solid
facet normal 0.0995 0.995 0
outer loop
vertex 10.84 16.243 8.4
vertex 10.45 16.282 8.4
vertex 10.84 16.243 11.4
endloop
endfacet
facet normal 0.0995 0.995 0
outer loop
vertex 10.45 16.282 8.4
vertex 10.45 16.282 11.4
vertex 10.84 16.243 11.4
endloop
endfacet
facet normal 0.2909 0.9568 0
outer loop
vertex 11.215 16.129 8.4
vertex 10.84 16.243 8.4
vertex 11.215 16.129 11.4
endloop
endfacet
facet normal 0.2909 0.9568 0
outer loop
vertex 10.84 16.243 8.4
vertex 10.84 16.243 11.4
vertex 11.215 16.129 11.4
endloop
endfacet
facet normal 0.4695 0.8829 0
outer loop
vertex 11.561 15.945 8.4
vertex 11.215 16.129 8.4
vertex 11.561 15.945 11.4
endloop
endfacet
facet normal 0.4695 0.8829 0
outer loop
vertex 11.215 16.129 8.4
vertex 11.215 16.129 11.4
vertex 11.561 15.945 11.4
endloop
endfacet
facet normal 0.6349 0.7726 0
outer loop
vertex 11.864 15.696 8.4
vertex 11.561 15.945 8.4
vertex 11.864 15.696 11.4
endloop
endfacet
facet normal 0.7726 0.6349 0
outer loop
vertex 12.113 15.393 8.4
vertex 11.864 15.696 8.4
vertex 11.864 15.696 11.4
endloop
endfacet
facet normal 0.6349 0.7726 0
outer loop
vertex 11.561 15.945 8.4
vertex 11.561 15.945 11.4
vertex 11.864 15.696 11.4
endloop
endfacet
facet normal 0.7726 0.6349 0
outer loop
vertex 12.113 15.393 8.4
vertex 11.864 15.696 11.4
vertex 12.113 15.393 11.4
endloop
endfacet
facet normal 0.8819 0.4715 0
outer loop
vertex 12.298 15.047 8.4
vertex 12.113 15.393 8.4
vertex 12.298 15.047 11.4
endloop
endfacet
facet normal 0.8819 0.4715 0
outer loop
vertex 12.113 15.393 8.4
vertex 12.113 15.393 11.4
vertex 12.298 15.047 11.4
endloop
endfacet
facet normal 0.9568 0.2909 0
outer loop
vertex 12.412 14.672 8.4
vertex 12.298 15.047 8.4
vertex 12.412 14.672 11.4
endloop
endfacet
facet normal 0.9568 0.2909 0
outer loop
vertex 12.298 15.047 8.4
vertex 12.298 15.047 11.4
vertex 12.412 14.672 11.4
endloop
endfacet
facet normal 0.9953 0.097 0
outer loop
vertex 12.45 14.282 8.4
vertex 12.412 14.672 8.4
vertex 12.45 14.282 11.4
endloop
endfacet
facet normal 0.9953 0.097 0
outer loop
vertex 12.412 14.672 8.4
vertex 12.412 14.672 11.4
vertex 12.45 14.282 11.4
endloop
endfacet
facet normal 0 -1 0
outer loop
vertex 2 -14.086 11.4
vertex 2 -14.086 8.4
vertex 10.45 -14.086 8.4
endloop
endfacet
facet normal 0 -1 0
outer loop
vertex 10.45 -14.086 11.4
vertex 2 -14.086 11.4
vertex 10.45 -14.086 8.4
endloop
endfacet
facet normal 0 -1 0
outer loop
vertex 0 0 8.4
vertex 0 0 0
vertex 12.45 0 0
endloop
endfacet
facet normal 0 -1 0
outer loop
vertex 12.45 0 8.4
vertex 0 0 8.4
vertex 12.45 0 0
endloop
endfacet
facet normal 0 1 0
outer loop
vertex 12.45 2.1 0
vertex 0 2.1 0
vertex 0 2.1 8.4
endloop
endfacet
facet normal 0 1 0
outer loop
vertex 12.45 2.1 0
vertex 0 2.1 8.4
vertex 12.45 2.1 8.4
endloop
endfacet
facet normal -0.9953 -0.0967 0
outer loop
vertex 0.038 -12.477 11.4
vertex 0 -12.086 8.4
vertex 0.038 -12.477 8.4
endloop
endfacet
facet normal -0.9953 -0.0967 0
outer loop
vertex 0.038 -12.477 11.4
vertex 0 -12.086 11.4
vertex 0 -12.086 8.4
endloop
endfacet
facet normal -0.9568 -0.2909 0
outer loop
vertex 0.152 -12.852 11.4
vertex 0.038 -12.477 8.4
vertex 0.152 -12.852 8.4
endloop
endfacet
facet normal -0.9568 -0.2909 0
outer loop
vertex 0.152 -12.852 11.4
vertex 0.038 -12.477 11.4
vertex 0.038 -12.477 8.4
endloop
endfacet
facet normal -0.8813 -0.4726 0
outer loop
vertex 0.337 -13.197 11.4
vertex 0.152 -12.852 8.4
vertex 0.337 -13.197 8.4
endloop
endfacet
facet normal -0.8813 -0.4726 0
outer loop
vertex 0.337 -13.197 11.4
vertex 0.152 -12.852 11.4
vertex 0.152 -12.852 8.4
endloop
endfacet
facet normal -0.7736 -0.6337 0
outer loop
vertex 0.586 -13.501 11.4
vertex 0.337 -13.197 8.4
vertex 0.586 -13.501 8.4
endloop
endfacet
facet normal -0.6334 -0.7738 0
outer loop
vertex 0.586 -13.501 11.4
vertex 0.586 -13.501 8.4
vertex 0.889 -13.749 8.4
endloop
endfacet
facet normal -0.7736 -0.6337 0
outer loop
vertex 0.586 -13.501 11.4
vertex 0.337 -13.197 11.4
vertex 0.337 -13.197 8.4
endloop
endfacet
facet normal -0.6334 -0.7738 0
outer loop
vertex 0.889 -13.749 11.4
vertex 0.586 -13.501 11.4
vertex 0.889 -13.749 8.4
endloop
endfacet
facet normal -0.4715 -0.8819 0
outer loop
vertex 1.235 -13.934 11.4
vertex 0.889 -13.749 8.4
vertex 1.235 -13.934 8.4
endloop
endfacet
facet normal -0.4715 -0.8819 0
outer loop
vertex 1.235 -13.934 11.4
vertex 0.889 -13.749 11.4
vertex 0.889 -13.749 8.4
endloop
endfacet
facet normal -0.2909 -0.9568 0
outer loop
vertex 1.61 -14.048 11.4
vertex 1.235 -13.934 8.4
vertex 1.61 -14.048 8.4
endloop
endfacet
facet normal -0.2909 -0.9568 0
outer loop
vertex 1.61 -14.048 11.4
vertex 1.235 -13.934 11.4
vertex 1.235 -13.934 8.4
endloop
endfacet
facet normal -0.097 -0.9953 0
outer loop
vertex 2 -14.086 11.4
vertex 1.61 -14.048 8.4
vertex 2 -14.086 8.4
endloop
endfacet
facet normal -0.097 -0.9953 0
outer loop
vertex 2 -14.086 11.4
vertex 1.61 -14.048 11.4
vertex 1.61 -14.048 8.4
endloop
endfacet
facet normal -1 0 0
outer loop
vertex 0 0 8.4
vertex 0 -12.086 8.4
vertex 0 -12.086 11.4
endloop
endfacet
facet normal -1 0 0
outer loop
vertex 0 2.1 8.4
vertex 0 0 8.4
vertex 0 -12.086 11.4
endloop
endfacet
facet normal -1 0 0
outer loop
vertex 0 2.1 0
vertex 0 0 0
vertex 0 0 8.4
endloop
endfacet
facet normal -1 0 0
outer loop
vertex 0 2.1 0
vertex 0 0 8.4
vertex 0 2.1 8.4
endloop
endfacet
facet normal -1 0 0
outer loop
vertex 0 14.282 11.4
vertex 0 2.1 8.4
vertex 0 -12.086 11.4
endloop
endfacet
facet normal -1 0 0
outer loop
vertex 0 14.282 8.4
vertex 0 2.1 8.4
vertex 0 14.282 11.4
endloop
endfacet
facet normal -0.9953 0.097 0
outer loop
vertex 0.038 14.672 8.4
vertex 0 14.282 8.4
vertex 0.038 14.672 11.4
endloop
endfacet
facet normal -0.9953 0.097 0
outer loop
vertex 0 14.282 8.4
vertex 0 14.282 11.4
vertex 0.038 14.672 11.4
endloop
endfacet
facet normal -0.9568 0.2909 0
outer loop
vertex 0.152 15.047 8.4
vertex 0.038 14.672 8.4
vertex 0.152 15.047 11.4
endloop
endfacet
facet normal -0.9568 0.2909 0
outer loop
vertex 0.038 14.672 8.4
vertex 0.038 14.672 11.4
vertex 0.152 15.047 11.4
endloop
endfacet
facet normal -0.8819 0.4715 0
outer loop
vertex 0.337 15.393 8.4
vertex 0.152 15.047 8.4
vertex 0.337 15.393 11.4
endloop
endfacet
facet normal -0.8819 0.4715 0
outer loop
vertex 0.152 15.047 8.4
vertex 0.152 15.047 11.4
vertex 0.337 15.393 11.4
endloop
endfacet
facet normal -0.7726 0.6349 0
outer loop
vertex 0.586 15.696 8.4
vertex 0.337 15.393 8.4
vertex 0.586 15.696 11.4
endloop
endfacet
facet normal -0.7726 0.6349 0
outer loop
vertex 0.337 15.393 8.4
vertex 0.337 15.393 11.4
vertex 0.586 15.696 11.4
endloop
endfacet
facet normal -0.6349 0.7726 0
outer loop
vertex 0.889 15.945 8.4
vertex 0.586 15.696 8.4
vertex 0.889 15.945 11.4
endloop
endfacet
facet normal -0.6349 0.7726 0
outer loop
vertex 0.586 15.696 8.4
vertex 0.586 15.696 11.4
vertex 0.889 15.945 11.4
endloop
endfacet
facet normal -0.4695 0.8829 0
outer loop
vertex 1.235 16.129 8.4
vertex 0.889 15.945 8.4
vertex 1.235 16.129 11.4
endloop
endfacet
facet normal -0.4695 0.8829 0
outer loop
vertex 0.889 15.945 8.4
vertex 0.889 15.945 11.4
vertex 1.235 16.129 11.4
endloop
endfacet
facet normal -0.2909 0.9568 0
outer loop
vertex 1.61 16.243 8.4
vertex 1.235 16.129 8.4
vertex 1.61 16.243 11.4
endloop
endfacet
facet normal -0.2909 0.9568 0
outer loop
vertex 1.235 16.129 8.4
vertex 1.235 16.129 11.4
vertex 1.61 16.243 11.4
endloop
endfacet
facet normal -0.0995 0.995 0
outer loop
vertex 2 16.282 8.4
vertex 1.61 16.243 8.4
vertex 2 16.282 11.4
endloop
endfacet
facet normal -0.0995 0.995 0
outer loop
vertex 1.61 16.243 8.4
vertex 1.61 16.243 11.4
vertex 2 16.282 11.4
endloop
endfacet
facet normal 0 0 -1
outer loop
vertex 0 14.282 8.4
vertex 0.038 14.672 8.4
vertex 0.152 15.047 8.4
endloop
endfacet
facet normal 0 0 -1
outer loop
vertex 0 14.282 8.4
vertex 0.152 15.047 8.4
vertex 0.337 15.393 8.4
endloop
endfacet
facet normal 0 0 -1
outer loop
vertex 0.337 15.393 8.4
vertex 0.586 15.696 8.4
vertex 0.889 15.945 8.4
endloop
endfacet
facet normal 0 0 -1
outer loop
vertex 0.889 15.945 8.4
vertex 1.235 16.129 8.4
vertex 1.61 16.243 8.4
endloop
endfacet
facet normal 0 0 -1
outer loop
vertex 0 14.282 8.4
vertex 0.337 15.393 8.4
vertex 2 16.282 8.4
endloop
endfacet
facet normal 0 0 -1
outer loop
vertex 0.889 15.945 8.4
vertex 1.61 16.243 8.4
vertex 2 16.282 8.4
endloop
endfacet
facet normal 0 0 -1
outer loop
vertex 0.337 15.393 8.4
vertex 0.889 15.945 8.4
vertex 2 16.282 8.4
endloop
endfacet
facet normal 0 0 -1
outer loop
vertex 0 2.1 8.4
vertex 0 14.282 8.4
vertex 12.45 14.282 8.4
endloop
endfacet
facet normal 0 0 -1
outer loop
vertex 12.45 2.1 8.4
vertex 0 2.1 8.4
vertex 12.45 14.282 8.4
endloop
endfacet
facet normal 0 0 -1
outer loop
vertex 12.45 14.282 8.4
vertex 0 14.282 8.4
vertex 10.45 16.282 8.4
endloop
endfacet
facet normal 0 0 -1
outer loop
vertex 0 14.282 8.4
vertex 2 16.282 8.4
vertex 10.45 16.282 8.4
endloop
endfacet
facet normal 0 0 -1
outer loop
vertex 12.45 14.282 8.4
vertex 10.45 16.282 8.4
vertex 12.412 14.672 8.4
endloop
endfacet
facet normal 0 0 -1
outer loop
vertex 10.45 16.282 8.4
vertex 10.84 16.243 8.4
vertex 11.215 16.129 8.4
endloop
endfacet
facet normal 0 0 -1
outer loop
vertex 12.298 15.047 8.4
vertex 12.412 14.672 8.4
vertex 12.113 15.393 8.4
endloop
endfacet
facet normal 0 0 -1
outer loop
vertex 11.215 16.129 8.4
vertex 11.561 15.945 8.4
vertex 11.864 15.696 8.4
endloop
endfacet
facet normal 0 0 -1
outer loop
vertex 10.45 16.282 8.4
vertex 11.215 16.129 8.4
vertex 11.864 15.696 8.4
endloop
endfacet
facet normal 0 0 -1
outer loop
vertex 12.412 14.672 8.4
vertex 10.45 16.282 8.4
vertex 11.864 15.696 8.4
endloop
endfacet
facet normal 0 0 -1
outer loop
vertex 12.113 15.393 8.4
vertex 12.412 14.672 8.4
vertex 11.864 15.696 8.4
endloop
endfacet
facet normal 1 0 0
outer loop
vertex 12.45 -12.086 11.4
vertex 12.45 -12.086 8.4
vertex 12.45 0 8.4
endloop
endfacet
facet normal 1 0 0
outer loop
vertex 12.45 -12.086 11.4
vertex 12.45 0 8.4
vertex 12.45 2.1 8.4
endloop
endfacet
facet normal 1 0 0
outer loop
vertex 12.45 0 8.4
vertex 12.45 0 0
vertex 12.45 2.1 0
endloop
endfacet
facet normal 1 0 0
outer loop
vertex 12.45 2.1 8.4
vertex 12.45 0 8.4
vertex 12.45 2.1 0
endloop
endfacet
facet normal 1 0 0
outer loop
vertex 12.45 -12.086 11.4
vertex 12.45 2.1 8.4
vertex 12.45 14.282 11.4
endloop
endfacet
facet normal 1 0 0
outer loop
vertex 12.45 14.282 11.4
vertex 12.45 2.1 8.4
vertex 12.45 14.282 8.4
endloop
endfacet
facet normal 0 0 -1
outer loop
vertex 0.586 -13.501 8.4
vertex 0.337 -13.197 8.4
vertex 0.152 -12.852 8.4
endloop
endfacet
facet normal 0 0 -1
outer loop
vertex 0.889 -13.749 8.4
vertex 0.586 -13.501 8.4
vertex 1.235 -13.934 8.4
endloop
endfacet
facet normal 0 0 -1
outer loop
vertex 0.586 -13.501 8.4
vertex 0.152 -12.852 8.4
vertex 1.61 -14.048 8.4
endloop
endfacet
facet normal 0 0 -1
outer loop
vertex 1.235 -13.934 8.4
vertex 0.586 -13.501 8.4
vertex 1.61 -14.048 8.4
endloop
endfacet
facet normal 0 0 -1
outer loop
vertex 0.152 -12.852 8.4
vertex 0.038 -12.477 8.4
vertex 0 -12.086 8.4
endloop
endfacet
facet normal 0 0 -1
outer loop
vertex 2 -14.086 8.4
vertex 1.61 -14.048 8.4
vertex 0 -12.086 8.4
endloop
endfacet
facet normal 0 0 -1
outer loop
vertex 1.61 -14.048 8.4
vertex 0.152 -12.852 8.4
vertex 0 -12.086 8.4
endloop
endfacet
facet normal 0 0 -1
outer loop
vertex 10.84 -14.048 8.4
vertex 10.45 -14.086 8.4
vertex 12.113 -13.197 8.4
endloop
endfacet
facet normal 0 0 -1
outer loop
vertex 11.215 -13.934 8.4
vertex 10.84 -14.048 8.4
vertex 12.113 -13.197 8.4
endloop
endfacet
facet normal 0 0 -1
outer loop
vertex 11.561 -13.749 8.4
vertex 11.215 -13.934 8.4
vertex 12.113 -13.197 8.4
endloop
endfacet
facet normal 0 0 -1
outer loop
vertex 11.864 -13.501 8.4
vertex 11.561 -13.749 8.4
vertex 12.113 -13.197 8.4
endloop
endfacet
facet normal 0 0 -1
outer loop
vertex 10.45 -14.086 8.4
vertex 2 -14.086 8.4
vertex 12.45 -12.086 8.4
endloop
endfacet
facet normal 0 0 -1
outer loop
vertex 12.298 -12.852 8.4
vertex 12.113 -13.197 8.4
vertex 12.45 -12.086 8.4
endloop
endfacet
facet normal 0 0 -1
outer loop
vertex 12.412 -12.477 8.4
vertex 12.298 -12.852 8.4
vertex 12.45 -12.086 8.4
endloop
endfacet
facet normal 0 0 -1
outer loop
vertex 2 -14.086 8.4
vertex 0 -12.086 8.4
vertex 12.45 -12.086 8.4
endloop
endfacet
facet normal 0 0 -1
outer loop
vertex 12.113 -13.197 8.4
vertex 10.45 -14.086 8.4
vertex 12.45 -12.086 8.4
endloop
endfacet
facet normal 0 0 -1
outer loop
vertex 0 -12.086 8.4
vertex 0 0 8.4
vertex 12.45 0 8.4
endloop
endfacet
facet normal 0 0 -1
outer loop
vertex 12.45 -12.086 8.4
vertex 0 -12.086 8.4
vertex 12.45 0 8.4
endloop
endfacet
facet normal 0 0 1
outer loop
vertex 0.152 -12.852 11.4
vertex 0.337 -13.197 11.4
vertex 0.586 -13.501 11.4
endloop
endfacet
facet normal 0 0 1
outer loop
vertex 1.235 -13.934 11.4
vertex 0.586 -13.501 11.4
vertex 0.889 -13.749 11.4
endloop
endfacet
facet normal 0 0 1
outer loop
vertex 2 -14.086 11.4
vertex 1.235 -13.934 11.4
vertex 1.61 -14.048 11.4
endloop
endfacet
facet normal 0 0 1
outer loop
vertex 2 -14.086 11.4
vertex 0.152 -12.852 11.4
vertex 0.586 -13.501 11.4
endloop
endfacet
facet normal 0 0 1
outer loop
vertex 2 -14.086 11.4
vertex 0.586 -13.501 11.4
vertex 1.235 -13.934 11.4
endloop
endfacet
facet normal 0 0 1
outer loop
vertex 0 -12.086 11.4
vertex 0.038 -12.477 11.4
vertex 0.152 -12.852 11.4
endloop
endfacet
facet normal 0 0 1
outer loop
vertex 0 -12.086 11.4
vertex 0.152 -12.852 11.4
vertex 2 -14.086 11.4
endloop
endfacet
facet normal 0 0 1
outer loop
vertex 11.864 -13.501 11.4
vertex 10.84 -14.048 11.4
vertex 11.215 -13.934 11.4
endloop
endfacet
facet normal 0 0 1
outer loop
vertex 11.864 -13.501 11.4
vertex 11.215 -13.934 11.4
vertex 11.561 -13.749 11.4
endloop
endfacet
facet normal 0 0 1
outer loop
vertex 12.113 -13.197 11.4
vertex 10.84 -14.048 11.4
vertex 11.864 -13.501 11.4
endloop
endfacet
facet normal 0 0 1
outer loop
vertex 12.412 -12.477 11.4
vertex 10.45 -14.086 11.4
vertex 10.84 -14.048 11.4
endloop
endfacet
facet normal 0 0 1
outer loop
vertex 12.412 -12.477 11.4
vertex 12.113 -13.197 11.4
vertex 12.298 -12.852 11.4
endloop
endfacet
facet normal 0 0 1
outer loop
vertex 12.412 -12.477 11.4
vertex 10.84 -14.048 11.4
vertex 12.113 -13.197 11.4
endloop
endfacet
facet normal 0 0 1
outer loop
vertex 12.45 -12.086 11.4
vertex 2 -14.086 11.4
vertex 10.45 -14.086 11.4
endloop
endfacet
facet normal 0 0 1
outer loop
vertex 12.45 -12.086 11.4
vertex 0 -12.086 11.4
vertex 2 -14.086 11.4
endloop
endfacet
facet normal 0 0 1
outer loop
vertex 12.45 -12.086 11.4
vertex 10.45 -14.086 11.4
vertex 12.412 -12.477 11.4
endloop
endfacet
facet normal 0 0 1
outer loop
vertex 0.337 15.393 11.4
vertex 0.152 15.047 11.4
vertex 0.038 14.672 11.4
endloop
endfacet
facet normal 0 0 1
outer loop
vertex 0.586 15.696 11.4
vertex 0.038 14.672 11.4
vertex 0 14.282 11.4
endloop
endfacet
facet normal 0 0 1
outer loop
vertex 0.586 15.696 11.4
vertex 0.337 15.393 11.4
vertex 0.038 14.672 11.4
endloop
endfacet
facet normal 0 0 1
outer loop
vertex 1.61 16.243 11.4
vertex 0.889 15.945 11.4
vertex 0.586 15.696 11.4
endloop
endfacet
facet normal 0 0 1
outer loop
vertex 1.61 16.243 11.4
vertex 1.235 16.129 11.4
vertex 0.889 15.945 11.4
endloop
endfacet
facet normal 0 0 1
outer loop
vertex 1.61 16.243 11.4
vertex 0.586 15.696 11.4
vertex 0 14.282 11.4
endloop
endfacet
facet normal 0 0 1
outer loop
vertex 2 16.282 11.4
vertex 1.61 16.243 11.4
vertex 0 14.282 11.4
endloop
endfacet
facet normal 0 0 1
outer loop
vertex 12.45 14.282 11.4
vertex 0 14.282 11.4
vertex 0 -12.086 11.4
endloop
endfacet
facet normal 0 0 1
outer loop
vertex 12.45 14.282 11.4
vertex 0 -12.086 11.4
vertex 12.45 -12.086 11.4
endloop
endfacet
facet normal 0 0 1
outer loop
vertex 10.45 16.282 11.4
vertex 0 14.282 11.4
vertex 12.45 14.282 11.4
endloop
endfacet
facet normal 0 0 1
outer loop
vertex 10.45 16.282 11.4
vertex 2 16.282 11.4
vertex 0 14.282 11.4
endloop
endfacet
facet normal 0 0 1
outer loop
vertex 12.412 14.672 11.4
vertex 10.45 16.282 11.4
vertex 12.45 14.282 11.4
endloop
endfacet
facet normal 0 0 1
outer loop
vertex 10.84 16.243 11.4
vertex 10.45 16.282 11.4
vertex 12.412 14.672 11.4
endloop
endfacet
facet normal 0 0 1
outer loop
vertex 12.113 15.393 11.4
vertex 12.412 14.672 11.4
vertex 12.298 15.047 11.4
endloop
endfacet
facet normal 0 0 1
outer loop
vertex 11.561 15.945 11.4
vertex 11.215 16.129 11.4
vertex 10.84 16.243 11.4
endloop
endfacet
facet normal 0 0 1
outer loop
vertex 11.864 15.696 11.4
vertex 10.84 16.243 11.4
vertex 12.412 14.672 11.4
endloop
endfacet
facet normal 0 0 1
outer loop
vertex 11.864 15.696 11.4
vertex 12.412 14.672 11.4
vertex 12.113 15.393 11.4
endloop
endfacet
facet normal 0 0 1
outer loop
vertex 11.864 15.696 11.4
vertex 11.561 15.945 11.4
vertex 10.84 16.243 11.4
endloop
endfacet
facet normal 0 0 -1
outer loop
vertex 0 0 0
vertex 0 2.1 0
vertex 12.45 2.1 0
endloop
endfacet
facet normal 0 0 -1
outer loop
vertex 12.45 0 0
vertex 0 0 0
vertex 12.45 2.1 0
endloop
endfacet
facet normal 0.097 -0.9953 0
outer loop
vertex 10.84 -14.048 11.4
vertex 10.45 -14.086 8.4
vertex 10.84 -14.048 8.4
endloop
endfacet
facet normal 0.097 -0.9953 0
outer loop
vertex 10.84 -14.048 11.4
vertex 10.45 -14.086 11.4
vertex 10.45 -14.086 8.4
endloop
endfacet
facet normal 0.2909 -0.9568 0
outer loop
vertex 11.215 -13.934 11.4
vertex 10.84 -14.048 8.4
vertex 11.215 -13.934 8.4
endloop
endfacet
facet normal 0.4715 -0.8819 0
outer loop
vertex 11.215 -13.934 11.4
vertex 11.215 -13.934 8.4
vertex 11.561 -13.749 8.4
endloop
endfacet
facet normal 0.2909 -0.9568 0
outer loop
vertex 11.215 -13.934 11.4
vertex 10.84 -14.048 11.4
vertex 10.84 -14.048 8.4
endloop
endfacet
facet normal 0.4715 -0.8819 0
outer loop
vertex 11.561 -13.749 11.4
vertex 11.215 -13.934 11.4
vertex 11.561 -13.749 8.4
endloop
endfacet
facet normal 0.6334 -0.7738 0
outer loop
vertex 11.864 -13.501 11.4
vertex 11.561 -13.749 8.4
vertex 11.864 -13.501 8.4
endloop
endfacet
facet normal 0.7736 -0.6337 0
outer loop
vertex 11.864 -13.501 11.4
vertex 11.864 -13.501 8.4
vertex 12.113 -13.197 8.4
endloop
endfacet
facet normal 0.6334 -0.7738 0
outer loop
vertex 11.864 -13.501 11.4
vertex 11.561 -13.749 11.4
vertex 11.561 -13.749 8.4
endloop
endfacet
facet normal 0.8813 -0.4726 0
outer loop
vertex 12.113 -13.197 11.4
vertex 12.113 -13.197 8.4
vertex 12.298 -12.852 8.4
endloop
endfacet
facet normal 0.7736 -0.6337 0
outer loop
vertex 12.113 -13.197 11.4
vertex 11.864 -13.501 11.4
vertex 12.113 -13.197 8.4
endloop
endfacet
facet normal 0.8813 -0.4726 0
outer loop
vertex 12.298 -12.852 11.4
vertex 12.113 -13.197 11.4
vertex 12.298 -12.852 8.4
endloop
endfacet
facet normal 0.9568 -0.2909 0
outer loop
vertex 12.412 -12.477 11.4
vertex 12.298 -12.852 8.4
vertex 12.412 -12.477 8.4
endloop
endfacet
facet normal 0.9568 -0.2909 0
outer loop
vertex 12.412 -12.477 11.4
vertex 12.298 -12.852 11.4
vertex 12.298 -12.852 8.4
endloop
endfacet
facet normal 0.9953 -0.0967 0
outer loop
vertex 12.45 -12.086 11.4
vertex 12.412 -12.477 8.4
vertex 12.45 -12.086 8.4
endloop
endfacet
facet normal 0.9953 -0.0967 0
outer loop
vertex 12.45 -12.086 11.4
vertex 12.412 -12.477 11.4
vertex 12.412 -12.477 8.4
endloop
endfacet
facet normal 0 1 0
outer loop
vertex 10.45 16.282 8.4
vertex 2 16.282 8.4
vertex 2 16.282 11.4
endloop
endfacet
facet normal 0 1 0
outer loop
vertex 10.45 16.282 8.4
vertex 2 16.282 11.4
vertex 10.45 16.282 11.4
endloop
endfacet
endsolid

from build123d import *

# Parameters (mm, degrees)
ESQUISSE1_W        = 12.45
ESQUISSE1_H        = 2.1
BOSS_EXTRU_1_DEPTH = 8.4
ESQUISSE2_W        = 12.45
ESQUISSE2_H        = 30.368041495
BOSS_EXTRU_2_DEPTH = 3
CONG_1_R           = 2


with BuildPart() as part:
    # Esquisse1 → Boss.-Extru.1 (new body)
    with BuildSketch(Plane.XY):
        with Locations((6.225, 1.05)):
            Rectangle(ESQUISSE1_W, ESQUISSE1_H)
    extrude(amount=BOSS_EXTRU_1_DEPTH)

    # Esquisse2 → Boss.-Extru.2 (add)
    with BuildSketch(Plane.XY.offset(8.4)):
        with Locations((6.225, 1.097662534)):
            Rectangle(ESQUISSE2_W, ESQUISSE2_H)
    extrude(amount=BOSS_EXTRU_2_DEPTH)

    # Congé1
    cong_1_edges = [part.edges().sort_by_distance(p)[0] for p in [
        (12.45, -14.086358213, 9.9),
        (12.45, 16.281683282, 9.9),
        (0, 16.281683282, 9.9),
        (0, -14.086358213, 9.9),
    ]]
    fillet(cong_1_edges, radius=CONG_1_R)


solid = part.part
